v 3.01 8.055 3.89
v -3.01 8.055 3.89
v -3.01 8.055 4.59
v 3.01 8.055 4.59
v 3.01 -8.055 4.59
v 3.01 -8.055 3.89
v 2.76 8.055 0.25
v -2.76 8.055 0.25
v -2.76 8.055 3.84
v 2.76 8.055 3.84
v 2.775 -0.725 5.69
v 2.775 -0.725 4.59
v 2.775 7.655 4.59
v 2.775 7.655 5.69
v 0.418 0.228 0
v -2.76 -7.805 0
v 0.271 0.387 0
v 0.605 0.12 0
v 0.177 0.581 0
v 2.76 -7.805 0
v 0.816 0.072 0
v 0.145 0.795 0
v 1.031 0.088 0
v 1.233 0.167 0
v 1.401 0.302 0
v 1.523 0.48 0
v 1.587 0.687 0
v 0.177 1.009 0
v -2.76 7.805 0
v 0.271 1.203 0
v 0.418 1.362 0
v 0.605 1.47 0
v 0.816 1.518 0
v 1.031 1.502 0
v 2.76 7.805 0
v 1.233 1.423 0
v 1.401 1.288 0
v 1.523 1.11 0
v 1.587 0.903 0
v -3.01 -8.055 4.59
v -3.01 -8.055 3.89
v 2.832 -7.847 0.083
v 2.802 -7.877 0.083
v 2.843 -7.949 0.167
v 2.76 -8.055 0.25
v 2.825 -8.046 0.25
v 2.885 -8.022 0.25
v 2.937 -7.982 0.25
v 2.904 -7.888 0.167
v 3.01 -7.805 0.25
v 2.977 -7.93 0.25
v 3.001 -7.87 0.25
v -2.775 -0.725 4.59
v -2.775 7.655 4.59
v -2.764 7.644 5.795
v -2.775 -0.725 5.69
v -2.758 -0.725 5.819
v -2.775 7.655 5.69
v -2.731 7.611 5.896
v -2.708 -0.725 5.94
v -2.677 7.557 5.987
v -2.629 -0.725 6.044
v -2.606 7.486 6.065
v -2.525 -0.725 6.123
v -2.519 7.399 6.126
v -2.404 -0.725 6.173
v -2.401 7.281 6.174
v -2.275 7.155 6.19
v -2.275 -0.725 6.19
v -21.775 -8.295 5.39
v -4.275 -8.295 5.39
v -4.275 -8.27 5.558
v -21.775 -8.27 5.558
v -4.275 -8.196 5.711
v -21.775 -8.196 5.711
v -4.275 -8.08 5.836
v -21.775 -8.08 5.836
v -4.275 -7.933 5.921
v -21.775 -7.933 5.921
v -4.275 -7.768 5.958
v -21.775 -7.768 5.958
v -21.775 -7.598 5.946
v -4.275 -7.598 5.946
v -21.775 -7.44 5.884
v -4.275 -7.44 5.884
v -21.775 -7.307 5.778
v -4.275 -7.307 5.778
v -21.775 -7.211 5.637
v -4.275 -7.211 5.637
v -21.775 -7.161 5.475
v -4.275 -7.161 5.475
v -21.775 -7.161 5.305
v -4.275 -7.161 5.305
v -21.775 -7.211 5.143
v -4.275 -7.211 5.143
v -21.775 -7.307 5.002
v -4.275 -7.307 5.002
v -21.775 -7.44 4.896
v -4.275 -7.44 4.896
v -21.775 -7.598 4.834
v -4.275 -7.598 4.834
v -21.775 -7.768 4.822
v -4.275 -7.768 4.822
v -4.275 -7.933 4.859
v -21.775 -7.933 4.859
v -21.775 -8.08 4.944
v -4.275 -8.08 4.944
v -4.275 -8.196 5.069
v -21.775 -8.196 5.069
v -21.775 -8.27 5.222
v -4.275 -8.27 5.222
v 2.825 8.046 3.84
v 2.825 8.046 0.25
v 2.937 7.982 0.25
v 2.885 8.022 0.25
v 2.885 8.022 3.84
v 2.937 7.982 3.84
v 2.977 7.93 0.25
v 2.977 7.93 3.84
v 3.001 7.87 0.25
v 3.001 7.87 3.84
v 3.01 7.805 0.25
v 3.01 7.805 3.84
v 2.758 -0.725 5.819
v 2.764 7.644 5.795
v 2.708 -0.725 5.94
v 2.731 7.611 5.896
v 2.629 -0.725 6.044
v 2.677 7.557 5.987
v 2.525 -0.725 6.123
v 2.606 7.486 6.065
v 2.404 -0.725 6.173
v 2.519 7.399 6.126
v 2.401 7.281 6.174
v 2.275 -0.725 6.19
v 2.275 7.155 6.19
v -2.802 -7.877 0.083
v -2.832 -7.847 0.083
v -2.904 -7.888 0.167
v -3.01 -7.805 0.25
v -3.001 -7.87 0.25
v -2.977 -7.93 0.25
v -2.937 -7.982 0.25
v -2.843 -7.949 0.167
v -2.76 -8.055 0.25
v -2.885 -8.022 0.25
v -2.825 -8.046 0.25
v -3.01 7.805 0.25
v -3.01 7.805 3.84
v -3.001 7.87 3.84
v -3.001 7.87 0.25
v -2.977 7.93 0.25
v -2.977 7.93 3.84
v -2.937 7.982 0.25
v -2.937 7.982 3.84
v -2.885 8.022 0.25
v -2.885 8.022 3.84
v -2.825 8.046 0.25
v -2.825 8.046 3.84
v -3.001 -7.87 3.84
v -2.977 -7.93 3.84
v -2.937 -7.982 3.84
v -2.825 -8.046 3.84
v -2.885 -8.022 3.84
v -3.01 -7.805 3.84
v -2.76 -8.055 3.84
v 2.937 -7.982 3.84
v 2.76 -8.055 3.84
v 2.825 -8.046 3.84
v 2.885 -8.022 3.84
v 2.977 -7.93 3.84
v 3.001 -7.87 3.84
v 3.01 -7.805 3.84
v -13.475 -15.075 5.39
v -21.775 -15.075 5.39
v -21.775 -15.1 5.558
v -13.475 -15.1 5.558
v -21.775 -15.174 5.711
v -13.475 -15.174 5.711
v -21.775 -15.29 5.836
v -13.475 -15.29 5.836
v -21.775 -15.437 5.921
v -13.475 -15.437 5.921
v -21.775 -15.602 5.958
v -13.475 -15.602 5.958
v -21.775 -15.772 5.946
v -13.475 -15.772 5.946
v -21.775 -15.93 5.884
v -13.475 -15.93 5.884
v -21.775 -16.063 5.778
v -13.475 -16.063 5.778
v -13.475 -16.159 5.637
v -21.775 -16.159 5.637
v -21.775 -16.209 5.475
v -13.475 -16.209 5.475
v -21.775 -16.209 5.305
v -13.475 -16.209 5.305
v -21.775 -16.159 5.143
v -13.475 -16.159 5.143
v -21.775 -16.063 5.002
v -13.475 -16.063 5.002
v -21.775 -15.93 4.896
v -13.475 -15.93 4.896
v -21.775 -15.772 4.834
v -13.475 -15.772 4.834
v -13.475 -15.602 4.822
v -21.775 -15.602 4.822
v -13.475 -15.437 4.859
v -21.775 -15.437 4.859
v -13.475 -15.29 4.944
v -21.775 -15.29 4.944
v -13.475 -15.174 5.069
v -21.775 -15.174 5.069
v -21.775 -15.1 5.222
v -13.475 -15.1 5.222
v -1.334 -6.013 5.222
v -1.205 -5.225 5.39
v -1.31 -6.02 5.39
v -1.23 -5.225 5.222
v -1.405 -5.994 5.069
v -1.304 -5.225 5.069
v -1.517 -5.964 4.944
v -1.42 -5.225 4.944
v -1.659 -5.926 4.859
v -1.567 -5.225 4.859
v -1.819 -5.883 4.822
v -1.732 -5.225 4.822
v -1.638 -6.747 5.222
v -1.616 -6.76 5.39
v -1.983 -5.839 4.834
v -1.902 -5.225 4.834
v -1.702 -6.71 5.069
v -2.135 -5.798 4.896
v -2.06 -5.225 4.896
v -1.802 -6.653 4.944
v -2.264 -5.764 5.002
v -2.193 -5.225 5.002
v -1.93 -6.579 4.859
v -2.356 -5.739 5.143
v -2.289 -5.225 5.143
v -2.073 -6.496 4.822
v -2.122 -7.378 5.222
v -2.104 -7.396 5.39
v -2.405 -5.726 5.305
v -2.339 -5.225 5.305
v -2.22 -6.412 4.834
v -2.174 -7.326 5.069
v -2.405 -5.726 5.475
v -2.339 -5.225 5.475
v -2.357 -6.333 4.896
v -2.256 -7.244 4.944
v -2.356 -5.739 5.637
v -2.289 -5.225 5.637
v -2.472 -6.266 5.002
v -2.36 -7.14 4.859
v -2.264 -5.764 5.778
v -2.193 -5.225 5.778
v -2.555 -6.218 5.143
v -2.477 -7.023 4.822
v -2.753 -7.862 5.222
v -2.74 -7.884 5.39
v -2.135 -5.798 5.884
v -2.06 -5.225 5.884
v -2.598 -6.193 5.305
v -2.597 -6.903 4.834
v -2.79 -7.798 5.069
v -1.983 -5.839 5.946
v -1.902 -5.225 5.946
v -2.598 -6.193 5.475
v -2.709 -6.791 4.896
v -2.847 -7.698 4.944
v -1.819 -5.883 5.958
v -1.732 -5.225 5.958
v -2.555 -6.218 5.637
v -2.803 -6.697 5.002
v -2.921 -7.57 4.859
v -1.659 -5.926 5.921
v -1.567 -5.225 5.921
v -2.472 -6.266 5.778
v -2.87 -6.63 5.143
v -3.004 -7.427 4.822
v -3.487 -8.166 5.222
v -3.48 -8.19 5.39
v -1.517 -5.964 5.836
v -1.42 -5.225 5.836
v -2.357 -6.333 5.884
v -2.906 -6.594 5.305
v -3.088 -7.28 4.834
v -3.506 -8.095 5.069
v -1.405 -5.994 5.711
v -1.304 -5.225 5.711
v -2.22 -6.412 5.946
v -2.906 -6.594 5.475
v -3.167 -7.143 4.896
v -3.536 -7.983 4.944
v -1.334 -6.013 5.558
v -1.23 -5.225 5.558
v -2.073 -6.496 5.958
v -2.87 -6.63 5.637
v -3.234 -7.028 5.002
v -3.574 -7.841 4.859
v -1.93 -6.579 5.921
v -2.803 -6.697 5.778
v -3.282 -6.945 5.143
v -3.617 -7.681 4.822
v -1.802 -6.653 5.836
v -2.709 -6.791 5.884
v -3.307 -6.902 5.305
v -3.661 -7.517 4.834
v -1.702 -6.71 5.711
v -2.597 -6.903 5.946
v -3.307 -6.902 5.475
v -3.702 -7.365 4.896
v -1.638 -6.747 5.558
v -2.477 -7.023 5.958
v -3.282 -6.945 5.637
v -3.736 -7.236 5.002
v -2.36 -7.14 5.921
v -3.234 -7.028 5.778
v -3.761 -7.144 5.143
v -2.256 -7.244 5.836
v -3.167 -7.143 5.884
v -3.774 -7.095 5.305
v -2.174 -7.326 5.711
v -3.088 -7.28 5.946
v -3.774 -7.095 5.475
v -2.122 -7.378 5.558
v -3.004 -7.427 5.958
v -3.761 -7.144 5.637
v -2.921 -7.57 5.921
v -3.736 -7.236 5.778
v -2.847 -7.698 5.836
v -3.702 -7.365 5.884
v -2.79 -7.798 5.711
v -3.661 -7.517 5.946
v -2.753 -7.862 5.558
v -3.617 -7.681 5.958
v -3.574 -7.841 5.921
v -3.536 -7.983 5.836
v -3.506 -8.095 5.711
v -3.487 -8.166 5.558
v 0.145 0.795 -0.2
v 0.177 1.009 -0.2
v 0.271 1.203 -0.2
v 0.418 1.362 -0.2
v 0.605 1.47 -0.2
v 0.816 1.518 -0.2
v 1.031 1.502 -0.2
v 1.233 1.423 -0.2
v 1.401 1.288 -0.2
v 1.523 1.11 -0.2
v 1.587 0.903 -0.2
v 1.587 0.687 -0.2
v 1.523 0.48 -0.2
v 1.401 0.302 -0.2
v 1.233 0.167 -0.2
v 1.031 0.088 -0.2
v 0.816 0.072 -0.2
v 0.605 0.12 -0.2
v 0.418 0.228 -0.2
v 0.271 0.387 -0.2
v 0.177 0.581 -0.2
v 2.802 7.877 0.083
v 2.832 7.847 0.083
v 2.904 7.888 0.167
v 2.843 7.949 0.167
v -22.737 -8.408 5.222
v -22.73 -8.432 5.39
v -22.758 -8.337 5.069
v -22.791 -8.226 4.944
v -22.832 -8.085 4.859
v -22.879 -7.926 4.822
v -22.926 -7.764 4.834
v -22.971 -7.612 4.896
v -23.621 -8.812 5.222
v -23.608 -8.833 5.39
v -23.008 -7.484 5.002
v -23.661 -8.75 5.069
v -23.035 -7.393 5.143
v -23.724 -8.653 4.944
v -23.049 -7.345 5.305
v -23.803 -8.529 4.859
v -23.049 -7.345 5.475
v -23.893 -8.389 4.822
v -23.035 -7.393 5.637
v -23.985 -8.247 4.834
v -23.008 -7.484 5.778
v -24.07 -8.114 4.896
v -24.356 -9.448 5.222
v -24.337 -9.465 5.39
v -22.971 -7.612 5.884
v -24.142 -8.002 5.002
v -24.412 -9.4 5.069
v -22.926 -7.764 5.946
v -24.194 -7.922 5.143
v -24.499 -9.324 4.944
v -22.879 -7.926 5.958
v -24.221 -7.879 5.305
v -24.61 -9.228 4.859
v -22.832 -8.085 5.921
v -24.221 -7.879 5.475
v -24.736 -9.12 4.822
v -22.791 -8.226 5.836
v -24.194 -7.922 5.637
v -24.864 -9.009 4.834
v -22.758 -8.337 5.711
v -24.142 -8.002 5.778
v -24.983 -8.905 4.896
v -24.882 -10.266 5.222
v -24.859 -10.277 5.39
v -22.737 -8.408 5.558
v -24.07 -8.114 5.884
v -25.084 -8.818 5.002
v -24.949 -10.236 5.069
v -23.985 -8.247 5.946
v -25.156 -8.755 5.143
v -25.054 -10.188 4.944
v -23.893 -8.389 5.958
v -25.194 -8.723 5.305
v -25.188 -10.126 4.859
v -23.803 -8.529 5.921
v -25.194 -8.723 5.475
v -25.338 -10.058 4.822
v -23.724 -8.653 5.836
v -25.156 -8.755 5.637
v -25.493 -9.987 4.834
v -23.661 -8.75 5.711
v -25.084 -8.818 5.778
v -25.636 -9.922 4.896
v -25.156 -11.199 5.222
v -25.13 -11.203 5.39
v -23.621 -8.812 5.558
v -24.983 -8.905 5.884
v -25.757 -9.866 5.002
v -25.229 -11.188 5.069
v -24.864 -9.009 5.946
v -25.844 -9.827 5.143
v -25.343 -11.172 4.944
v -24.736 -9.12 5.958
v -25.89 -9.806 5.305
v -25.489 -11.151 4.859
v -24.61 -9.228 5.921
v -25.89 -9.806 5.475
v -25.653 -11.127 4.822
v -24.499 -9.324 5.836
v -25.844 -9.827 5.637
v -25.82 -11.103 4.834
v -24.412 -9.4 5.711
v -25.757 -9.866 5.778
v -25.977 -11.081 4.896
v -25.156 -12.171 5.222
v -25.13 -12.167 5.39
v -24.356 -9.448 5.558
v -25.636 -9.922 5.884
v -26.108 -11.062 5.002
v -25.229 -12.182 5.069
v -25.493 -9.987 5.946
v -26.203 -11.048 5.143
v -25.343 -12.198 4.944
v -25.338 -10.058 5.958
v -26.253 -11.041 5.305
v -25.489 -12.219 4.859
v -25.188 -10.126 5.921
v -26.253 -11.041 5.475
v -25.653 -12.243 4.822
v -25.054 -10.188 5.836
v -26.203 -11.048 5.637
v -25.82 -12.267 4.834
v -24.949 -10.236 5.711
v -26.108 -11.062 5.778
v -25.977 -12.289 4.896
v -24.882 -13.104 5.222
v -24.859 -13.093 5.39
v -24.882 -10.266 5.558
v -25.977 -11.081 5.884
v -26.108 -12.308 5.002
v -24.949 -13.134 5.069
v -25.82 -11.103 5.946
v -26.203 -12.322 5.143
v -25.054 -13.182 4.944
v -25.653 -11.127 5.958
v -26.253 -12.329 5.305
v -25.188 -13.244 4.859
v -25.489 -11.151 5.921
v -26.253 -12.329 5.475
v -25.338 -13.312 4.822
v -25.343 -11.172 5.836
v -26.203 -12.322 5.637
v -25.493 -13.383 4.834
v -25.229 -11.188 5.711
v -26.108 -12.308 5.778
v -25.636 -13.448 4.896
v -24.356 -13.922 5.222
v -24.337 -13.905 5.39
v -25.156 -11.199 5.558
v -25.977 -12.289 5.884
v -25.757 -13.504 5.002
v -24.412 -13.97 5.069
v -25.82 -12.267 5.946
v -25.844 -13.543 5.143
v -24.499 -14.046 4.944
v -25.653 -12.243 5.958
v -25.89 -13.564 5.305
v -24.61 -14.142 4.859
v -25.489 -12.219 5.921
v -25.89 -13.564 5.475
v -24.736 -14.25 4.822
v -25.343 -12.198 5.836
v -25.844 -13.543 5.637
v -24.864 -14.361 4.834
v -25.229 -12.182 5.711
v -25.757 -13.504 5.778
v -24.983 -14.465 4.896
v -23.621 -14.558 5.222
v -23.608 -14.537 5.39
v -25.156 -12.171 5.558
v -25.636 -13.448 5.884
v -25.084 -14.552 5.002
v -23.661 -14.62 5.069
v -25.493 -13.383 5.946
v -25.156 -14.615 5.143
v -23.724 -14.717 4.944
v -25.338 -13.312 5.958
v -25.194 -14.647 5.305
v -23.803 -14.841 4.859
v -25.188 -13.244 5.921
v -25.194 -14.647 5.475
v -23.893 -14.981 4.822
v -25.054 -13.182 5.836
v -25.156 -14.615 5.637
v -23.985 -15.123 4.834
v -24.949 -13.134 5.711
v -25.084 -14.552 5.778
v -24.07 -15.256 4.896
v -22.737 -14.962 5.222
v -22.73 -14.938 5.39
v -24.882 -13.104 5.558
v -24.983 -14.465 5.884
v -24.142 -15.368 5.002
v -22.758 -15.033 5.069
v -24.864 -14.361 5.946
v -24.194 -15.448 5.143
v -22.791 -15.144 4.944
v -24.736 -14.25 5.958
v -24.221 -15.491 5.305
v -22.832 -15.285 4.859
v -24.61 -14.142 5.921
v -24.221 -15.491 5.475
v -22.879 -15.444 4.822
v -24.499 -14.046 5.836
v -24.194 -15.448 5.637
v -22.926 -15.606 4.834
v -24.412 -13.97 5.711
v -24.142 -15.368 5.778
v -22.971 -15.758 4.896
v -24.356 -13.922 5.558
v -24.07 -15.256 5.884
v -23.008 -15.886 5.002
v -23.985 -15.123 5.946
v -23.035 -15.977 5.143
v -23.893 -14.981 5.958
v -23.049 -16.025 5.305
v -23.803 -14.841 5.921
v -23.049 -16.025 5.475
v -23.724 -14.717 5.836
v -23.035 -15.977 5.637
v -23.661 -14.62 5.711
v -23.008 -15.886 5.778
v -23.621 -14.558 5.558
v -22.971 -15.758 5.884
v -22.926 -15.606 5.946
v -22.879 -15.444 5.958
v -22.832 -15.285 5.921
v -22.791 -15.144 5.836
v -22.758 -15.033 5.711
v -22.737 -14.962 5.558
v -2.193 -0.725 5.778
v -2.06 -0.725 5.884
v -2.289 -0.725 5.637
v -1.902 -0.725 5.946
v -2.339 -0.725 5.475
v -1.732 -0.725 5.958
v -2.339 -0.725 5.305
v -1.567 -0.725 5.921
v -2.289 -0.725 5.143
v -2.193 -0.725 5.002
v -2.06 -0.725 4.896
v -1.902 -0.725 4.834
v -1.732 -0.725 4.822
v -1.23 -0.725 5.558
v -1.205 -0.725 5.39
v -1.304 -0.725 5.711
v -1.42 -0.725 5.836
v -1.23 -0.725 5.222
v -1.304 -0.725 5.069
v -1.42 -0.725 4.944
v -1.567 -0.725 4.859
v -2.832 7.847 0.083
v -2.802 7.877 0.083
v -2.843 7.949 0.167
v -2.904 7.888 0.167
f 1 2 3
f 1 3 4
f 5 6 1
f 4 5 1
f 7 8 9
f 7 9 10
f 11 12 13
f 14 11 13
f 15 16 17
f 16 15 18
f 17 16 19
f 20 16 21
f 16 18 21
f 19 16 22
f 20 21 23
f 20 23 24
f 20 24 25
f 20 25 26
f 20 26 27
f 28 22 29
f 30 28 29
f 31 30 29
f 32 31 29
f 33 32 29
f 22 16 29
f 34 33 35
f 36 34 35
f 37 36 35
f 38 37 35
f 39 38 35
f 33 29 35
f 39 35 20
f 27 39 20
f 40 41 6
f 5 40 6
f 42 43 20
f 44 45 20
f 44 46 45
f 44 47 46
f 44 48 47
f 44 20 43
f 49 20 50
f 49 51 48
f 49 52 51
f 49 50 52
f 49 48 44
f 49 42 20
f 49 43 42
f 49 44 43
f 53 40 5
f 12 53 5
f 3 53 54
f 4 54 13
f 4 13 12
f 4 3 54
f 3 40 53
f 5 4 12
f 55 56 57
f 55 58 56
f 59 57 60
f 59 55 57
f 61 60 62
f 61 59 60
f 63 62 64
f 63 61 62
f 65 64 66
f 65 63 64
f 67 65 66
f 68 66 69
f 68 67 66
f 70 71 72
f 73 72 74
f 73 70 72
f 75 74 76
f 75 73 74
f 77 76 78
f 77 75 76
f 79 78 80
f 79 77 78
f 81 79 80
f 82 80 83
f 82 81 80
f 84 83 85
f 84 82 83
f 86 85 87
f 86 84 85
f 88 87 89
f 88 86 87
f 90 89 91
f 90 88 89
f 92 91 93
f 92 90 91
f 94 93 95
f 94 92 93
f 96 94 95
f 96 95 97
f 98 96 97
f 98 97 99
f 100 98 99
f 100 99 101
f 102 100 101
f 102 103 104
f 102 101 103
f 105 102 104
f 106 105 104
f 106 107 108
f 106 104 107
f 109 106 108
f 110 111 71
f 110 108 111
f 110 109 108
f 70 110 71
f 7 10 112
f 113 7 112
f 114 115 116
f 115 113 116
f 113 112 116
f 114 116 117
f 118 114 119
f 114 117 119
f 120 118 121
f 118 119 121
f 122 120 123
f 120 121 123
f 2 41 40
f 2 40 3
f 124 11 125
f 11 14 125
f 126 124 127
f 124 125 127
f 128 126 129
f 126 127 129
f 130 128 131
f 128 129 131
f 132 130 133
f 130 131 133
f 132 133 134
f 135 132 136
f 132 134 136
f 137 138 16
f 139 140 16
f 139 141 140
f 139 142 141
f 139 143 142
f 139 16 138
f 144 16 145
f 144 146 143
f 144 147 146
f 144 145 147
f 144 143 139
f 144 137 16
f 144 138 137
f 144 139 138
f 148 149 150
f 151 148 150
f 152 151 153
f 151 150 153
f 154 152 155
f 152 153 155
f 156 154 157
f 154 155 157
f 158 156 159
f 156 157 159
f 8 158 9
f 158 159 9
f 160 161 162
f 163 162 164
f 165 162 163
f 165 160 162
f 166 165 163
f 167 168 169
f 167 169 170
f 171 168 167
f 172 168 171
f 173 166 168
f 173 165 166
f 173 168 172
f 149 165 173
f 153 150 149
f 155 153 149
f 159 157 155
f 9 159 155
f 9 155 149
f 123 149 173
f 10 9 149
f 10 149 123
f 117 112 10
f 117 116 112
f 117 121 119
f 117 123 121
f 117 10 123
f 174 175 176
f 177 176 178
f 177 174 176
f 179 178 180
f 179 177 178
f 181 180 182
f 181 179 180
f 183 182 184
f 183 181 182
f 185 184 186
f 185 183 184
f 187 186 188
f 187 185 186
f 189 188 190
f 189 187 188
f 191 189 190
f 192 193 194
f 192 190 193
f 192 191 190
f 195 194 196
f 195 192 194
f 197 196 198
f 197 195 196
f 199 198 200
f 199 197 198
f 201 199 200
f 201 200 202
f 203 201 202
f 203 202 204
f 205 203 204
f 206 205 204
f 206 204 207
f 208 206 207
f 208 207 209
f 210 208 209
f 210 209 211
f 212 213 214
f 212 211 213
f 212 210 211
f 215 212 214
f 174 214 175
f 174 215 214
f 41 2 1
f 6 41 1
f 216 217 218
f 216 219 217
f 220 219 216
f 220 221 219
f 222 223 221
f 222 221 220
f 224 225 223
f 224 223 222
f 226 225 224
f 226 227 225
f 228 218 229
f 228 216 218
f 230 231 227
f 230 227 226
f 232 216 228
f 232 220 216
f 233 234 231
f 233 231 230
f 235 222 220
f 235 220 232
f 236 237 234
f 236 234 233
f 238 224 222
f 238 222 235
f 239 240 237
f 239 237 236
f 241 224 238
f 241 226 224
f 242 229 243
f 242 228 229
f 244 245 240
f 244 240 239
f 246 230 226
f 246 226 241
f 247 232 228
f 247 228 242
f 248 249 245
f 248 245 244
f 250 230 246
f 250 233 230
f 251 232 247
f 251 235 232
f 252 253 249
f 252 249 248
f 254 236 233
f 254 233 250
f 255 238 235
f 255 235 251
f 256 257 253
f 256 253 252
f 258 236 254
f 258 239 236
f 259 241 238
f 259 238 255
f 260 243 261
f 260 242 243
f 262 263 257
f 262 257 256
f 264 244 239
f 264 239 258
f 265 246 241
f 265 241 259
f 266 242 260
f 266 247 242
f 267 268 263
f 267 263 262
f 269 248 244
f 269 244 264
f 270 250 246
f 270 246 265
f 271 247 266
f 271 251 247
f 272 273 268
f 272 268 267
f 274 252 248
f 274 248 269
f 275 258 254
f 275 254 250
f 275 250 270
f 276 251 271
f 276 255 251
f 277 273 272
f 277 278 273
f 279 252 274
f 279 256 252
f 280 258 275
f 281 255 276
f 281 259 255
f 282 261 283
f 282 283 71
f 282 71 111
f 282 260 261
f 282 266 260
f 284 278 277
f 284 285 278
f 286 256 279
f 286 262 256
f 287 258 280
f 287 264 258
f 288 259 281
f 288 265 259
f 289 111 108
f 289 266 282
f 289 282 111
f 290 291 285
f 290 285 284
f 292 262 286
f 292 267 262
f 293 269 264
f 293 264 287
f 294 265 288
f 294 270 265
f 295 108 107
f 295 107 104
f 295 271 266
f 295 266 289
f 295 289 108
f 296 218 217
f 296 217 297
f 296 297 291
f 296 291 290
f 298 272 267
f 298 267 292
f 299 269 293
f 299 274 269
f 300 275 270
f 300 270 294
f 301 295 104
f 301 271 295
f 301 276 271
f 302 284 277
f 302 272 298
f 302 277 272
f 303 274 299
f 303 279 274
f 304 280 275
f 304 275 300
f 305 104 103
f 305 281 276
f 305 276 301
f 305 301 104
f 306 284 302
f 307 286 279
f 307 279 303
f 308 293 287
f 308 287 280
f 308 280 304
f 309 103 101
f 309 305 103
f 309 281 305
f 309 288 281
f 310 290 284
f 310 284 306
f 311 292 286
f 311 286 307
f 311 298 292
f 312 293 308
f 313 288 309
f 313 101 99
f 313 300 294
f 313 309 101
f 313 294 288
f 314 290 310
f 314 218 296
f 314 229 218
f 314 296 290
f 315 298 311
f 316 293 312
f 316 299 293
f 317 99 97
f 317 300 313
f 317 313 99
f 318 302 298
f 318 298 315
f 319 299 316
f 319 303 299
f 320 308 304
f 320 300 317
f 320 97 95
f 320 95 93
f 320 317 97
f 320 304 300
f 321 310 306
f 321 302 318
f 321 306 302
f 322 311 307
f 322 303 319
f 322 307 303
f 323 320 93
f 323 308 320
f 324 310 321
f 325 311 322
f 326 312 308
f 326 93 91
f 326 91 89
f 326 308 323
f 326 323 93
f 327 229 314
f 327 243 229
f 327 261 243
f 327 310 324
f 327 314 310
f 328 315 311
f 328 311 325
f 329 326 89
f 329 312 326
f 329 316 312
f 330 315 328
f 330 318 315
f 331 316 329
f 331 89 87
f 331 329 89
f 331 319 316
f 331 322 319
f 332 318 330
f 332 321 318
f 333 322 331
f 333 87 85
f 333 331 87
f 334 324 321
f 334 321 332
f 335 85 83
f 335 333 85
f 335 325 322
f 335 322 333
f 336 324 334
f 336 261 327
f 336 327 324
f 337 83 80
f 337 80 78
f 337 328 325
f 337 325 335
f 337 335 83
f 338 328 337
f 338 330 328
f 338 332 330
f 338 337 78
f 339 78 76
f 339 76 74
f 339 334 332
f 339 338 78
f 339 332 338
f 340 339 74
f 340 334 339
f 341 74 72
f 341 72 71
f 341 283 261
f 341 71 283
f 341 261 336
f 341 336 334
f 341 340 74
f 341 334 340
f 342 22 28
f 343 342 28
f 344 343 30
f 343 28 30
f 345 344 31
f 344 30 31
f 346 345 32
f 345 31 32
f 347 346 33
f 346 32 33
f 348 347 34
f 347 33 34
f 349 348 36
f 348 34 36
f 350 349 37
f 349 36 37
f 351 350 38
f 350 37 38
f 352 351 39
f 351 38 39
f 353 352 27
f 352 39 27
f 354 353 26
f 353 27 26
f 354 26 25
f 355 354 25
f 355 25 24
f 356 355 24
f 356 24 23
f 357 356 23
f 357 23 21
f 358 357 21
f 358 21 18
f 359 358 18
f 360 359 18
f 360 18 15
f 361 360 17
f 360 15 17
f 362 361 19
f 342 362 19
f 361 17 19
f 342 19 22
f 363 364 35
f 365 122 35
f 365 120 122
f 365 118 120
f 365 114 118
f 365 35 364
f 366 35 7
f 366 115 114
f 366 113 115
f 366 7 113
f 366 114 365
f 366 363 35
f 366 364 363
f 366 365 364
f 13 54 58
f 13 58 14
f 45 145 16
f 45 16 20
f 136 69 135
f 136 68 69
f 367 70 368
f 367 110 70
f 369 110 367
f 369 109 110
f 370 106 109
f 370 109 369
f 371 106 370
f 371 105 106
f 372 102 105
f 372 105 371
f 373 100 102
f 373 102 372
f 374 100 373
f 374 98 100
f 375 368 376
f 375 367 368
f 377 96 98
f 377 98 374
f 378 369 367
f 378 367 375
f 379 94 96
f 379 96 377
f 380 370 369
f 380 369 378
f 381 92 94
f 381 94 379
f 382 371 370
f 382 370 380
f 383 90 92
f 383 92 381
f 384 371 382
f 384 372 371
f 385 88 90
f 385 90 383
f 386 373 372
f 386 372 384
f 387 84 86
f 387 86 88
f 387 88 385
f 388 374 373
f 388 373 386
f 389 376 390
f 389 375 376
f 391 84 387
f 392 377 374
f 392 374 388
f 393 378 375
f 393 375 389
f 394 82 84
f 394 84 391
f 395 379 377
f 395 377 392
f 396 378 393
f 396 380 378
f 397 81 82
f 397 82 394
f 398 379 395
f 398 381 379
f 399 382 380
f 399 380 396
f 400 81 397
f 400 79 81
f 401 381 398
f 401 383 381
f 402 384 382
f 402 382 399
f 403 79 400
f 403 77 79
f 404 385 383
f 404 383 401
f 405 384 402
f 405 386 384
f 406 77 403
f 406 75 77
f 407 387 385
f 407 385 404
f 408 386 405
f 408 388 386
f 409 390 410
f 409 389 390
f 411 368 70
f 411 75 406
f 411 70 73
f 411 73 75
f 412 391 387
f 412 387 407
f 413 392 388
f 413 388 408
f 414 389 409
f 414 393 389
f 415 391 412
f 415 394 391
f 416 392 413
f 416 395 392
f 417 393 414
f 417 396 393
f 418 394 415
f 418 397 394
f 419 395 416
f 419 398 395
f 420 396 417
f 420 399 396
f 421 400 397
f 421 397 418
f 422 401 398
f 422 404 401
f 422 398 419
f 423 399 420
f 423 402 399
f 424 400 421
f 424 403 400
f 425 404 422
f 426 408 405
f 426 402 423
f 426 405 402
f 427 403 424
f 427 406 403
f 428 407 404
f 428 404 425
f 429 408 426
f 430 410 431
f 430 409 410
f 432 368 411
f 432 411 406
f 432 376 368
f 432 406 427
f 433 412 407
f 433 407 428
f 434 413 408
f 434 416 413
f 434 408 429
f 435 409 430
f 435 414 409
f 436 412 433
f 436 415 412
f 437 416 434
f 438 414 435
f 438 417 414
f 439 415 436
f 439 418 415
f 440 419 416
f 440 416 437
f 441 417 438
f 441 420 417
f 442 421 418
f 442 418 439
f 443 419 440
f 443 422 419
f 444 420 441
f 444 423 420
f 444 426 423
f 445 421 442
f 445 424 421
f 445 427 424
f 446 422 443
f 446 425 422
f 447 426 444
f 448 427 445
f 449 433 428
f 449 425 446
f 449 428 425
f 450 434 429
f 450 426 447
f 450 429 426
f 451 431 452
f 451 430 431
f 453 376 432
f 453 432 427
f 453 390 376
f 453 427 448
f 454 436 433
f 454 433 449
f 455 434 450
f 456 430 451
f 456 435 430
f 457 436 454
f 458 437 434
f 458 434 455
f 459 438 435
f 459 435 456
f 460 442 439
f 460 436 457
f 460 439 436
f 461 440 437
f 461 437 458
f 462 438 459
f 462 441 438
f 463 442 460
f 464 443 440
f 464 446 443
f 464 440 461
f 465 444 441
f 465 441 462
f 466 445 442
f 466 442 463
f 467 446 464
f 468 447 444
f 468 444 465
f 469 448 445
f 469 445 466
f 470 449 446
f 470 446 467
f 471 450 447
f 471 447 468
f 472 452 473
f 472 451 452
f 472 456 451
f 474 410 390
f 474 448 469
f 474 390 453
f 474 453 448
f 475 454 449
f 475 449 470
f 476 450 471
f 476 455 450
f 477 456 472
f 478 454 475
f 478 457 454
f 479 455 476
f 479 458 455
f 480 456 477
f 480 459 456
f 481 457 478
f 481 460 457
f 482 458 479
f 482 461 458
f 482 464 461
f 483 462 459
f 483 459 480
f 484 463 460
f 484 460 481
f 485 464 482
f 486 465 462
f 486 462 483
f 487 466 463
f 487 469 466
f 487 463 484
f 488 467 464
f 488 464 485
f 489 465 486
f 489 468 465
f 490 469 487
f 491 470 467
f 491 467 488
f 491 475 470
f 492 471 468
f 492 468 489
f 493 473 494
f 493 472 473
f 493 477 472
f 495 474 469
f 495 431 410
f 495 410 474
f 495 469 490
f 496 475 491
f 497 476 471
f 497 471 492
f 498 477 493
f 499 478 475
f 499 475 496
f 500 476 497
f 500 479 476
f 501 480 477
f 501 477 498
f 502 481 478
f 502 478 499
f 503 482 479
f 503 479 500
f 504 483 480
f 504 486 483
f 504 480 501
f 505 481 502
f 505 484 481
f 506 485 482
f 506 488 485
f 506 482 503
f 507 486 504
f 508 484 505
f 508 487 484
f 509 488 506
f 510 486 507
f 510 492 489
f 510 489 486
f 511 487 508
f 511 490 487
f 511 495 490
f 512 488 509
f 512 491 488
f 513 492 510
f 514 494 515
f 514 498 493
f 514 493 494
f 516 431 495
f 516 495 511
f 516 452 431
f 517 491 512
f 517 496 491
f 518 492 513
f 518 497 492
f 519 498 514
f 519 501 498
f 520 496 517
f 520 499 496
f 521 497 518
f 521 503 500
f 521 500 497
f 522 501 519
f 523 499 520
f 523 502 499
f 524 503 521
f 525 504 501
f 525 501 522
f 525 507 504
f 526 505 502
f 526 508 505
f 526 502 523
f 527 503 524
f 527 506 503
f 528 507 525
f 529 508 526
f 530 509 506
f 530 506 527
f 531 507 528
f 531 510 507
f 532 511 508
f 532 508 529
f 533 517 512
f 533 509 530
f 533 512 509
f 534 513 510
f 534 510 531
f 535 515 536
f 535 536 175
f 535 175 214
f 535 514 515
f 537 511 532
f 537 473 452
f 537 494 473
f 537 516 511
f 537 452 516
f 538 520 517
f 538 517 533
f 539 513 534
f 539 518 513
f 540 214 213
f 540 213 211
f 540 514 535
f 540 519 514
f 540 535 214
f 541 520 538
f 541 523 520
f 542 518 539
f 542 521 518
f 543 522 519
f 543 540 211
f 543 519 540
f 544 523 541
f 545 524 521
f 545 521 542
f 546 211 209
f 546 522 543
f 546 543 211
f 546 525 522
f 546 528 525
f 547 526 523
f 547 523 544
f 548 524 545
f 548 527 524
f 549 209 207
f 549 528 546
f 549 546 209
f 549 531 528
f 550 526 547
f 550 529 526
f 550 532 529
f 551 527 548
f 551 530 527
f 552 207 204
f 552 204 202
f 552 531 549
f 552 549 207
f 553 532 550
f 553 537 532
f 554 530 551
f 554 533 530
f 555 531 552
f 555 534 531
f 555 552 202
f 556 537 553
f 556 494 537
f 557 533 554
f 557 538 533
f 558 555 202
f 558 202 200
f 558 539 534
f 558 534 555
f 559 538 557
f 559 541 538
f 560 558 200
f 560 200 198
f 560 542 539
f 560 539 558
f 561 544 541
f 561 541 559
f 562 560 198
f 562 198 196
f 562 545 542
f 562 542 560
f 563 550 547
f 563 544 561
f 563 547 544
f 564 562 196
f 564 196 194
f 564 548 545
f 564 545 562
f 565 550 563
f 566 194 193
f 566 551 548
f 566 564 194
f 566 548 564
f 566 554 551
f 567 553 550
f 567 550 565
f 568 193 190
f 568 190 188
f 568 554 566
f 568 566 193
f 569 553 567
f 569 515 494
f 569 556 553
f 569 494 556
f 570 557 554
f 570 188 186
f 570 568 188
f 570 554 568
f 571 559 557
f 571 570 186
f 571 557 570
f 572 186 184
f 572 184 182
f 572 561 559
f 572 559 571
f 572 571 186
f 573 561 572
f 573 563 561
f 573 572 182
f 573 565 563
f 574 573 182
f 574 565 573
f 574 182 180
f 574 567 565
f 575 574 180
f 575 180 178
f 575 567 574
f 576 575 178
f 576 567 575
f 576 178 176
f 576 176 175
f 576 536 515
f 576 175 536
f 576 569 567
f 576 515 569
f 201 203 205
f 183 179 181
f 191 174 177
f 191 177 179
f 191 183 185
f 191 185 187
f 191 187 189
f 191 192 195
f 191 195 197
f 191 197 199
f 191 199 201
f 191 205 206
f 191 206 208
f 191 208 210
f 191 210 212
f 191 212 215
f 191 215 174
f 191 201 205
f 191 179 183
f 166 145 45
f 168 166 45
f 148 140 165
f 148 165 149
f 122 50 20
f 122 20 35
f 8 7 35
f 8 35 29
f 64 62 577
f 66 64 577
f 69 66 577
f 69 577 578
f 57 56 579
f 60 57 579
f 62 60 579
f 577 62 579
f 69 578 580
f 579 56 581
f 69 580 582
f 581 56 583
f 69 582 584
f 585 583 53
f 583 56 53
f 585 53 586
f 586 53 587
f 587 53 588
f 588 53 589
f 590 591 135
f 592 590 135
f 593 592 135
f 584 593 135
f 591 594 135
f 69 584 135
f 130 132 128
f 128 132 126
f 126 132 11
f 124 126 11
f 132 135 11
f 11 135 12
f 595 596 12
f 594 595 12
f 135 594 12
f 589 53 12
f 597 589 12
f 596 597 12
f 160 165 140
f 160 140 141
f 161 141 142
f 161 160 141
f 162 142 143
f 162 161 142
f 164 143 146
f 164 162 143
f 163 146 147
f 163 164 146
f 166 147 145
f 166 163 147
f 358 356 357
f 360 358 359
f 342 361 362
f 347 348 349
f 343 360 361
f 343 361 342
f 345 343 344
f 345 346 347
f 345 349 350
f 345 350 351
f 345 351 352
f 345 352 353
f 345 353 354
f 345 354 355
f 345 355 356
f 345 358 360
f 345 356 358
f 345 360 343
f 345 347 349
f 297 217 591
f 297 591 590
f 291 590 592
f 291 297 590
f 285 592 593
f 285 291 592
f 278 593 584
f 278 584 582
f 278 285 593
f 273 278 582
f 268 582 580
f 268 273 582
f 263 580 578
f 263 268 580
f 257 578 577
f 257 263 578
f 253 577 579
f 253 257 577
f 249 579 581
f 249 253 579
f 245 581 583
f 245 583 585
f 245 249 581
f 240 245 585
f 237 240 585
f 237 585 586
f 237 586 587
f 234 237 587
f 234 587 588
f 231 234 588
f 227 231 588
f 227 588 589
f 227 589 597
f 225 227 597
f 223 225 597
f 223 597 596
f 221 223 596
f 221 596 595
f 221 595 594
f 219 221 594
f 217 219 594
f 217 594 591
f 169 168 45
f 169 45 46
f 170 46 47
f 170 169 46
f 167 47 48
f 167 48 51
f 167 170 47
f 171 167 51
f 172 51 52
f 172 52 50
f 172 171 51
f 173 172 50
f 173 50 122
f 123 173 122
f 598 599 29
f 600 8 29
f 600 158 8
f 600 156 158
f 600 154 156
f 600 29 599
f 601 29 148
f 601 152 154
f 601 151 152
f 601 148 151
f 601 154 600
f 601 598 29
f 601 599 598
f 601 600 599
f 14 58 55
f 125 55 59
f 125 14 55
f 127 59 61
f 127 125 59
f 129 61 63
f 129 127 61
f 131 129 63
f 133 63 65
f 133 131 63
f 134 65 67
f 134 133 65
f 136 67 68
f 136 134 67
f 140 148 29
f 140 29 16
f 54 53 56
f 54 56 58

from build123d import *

# Parameters (mm, degrees)
SKETCH_1_W      = 6.02
SKETCH_1_H      = 16.11
EXTRUDE_1_DEPTH = 3.84
SKETCH_2_R      = 0.725
EXTRUDE_2_DEPTH = 0.2
SKETCH_3_W      = 6.02
SKETCH_3_H      = 16.11
EXTRUDE_3_DEPTH = 0.7
SKETCH_4_W      = 5.55
SKETCH_4_H      = 8.38
EXTRUDE_4_DEPTH = 1.6
FILLET_1_R      = 0.5
FILLET_2_R      = 0.25
CHAMFER_1_SIZE  = 0.25
SKETCH_5_R      = 0.57


with BuildPart() as part:
    # Эскиз1 → Бобышка-Вытянуть1 (new body)
    with BuildSketch(Plane.XY):
        Rectangle(SKETCH_1_W, SKETCH_1_H)
    extrude(amount=EXTRUDE_1_DEPTH)

    # Эскиз2 → Бобышка-Вытянуть2 (add)
    with BuildSketch(Plane(origin=(0, 0, 0), x_dir=(-1, 0, 0), z_dir=(0, 0, -1))):
        with Locations((-0.87, 0.795)):
            Circle(SKETCH_2_R)
    extrude(amount=EXTRUDE_2_DEPTH)

    # Скругление2
    fillet_2_edges = [part.edges().sort_by_distance(p)[0] for p in [
        (3.01, -8.055, 1.92),
        (-3.01, -8.055, 1.92),
        (-3.01, 8.055, 1.92),
        (3.01, 8.055, 1.92),
    ]]
    fillet(fillet_2_edges, radius=FILLET_2_R)

    # Фаска1
    chamfer_1_edges = [part.edges().sort_by_distance(p)[0] for p in [
        (0, -8.055, 0),
        (3.01, 0, 0),
        (-3.01, 0, 0),
        (0, 8.055, 0),
        (-2.936776695, 7.981776695, 0),
        (2.936776695, 7.981776695, 0),
        (2.936776695, -7.981776695, 0),
        (-2.936776695, -7.981776695, 0),
    ]]
    chamfer(chamfer_1_edges, length=CHAMFER_1_SIZE)


with BuildPart() as body_2:
    # Эскиз3 → Бобышка-Вытянуть3 (new body)
    with BuildSketch(Plane.XY.offset(3.89)):
        Rectangle(SKETCH_3_W, SKETCH_3_H)
    extrude(amount=EXTRUDE_3_DEPTH)

    # Эскиз4 → Бобышка-Вытянуть4 (add)
    with BuildSketch(Plane.XY.offset(4.59)):
        with Locations((0, 3.465)):
            Rectangle(SKETCH_4_W, SKETCH_4_H)
    extrude(amount=EXTRUDE_4_DEPTH)

    # Скругление1
    fillet_1_edges = [body_2.edges().sort_by_distance(p)[0] for p in [
        (2.775, 3.465, 6.19),
        (0, 7.655, 6.19),
        (-2.775, 3.465, 6.19),
    ]]
    fillet(fillet_1_edges, radius=FILLET_1_R)

    # По траектории1: sweep along a path in Эскиз6
    with BuildLine(Plane.XY.offset(5.39)) as sweep_1_path:
        Line((-1.775, -0.725), (-1.775, -5.225))
        ThreePointArc((-1.775, -5.225), (-2.507233047, -6.992766953), (-4.275, -7.725))
        Line((-4.275, -7.725), (-21.775, -7.725))
        ThreePointArc((-21.775, -7.725), (-25.735, -11.685), (-21.775, -15.645))
        Line((-21.775, -15.645), (-13.475, -15.645))
    # Эскиз5 → По траектории1 (sweep)
    with BuildSketch(Plane.XZ.offset(0.725)):
        with Locations((-1.775, 5.39)):
            Circle(SKETCH_5_R)
    sweep(path=sweep_1_path.line)


solid = Compound([part.part, body_2.part])
